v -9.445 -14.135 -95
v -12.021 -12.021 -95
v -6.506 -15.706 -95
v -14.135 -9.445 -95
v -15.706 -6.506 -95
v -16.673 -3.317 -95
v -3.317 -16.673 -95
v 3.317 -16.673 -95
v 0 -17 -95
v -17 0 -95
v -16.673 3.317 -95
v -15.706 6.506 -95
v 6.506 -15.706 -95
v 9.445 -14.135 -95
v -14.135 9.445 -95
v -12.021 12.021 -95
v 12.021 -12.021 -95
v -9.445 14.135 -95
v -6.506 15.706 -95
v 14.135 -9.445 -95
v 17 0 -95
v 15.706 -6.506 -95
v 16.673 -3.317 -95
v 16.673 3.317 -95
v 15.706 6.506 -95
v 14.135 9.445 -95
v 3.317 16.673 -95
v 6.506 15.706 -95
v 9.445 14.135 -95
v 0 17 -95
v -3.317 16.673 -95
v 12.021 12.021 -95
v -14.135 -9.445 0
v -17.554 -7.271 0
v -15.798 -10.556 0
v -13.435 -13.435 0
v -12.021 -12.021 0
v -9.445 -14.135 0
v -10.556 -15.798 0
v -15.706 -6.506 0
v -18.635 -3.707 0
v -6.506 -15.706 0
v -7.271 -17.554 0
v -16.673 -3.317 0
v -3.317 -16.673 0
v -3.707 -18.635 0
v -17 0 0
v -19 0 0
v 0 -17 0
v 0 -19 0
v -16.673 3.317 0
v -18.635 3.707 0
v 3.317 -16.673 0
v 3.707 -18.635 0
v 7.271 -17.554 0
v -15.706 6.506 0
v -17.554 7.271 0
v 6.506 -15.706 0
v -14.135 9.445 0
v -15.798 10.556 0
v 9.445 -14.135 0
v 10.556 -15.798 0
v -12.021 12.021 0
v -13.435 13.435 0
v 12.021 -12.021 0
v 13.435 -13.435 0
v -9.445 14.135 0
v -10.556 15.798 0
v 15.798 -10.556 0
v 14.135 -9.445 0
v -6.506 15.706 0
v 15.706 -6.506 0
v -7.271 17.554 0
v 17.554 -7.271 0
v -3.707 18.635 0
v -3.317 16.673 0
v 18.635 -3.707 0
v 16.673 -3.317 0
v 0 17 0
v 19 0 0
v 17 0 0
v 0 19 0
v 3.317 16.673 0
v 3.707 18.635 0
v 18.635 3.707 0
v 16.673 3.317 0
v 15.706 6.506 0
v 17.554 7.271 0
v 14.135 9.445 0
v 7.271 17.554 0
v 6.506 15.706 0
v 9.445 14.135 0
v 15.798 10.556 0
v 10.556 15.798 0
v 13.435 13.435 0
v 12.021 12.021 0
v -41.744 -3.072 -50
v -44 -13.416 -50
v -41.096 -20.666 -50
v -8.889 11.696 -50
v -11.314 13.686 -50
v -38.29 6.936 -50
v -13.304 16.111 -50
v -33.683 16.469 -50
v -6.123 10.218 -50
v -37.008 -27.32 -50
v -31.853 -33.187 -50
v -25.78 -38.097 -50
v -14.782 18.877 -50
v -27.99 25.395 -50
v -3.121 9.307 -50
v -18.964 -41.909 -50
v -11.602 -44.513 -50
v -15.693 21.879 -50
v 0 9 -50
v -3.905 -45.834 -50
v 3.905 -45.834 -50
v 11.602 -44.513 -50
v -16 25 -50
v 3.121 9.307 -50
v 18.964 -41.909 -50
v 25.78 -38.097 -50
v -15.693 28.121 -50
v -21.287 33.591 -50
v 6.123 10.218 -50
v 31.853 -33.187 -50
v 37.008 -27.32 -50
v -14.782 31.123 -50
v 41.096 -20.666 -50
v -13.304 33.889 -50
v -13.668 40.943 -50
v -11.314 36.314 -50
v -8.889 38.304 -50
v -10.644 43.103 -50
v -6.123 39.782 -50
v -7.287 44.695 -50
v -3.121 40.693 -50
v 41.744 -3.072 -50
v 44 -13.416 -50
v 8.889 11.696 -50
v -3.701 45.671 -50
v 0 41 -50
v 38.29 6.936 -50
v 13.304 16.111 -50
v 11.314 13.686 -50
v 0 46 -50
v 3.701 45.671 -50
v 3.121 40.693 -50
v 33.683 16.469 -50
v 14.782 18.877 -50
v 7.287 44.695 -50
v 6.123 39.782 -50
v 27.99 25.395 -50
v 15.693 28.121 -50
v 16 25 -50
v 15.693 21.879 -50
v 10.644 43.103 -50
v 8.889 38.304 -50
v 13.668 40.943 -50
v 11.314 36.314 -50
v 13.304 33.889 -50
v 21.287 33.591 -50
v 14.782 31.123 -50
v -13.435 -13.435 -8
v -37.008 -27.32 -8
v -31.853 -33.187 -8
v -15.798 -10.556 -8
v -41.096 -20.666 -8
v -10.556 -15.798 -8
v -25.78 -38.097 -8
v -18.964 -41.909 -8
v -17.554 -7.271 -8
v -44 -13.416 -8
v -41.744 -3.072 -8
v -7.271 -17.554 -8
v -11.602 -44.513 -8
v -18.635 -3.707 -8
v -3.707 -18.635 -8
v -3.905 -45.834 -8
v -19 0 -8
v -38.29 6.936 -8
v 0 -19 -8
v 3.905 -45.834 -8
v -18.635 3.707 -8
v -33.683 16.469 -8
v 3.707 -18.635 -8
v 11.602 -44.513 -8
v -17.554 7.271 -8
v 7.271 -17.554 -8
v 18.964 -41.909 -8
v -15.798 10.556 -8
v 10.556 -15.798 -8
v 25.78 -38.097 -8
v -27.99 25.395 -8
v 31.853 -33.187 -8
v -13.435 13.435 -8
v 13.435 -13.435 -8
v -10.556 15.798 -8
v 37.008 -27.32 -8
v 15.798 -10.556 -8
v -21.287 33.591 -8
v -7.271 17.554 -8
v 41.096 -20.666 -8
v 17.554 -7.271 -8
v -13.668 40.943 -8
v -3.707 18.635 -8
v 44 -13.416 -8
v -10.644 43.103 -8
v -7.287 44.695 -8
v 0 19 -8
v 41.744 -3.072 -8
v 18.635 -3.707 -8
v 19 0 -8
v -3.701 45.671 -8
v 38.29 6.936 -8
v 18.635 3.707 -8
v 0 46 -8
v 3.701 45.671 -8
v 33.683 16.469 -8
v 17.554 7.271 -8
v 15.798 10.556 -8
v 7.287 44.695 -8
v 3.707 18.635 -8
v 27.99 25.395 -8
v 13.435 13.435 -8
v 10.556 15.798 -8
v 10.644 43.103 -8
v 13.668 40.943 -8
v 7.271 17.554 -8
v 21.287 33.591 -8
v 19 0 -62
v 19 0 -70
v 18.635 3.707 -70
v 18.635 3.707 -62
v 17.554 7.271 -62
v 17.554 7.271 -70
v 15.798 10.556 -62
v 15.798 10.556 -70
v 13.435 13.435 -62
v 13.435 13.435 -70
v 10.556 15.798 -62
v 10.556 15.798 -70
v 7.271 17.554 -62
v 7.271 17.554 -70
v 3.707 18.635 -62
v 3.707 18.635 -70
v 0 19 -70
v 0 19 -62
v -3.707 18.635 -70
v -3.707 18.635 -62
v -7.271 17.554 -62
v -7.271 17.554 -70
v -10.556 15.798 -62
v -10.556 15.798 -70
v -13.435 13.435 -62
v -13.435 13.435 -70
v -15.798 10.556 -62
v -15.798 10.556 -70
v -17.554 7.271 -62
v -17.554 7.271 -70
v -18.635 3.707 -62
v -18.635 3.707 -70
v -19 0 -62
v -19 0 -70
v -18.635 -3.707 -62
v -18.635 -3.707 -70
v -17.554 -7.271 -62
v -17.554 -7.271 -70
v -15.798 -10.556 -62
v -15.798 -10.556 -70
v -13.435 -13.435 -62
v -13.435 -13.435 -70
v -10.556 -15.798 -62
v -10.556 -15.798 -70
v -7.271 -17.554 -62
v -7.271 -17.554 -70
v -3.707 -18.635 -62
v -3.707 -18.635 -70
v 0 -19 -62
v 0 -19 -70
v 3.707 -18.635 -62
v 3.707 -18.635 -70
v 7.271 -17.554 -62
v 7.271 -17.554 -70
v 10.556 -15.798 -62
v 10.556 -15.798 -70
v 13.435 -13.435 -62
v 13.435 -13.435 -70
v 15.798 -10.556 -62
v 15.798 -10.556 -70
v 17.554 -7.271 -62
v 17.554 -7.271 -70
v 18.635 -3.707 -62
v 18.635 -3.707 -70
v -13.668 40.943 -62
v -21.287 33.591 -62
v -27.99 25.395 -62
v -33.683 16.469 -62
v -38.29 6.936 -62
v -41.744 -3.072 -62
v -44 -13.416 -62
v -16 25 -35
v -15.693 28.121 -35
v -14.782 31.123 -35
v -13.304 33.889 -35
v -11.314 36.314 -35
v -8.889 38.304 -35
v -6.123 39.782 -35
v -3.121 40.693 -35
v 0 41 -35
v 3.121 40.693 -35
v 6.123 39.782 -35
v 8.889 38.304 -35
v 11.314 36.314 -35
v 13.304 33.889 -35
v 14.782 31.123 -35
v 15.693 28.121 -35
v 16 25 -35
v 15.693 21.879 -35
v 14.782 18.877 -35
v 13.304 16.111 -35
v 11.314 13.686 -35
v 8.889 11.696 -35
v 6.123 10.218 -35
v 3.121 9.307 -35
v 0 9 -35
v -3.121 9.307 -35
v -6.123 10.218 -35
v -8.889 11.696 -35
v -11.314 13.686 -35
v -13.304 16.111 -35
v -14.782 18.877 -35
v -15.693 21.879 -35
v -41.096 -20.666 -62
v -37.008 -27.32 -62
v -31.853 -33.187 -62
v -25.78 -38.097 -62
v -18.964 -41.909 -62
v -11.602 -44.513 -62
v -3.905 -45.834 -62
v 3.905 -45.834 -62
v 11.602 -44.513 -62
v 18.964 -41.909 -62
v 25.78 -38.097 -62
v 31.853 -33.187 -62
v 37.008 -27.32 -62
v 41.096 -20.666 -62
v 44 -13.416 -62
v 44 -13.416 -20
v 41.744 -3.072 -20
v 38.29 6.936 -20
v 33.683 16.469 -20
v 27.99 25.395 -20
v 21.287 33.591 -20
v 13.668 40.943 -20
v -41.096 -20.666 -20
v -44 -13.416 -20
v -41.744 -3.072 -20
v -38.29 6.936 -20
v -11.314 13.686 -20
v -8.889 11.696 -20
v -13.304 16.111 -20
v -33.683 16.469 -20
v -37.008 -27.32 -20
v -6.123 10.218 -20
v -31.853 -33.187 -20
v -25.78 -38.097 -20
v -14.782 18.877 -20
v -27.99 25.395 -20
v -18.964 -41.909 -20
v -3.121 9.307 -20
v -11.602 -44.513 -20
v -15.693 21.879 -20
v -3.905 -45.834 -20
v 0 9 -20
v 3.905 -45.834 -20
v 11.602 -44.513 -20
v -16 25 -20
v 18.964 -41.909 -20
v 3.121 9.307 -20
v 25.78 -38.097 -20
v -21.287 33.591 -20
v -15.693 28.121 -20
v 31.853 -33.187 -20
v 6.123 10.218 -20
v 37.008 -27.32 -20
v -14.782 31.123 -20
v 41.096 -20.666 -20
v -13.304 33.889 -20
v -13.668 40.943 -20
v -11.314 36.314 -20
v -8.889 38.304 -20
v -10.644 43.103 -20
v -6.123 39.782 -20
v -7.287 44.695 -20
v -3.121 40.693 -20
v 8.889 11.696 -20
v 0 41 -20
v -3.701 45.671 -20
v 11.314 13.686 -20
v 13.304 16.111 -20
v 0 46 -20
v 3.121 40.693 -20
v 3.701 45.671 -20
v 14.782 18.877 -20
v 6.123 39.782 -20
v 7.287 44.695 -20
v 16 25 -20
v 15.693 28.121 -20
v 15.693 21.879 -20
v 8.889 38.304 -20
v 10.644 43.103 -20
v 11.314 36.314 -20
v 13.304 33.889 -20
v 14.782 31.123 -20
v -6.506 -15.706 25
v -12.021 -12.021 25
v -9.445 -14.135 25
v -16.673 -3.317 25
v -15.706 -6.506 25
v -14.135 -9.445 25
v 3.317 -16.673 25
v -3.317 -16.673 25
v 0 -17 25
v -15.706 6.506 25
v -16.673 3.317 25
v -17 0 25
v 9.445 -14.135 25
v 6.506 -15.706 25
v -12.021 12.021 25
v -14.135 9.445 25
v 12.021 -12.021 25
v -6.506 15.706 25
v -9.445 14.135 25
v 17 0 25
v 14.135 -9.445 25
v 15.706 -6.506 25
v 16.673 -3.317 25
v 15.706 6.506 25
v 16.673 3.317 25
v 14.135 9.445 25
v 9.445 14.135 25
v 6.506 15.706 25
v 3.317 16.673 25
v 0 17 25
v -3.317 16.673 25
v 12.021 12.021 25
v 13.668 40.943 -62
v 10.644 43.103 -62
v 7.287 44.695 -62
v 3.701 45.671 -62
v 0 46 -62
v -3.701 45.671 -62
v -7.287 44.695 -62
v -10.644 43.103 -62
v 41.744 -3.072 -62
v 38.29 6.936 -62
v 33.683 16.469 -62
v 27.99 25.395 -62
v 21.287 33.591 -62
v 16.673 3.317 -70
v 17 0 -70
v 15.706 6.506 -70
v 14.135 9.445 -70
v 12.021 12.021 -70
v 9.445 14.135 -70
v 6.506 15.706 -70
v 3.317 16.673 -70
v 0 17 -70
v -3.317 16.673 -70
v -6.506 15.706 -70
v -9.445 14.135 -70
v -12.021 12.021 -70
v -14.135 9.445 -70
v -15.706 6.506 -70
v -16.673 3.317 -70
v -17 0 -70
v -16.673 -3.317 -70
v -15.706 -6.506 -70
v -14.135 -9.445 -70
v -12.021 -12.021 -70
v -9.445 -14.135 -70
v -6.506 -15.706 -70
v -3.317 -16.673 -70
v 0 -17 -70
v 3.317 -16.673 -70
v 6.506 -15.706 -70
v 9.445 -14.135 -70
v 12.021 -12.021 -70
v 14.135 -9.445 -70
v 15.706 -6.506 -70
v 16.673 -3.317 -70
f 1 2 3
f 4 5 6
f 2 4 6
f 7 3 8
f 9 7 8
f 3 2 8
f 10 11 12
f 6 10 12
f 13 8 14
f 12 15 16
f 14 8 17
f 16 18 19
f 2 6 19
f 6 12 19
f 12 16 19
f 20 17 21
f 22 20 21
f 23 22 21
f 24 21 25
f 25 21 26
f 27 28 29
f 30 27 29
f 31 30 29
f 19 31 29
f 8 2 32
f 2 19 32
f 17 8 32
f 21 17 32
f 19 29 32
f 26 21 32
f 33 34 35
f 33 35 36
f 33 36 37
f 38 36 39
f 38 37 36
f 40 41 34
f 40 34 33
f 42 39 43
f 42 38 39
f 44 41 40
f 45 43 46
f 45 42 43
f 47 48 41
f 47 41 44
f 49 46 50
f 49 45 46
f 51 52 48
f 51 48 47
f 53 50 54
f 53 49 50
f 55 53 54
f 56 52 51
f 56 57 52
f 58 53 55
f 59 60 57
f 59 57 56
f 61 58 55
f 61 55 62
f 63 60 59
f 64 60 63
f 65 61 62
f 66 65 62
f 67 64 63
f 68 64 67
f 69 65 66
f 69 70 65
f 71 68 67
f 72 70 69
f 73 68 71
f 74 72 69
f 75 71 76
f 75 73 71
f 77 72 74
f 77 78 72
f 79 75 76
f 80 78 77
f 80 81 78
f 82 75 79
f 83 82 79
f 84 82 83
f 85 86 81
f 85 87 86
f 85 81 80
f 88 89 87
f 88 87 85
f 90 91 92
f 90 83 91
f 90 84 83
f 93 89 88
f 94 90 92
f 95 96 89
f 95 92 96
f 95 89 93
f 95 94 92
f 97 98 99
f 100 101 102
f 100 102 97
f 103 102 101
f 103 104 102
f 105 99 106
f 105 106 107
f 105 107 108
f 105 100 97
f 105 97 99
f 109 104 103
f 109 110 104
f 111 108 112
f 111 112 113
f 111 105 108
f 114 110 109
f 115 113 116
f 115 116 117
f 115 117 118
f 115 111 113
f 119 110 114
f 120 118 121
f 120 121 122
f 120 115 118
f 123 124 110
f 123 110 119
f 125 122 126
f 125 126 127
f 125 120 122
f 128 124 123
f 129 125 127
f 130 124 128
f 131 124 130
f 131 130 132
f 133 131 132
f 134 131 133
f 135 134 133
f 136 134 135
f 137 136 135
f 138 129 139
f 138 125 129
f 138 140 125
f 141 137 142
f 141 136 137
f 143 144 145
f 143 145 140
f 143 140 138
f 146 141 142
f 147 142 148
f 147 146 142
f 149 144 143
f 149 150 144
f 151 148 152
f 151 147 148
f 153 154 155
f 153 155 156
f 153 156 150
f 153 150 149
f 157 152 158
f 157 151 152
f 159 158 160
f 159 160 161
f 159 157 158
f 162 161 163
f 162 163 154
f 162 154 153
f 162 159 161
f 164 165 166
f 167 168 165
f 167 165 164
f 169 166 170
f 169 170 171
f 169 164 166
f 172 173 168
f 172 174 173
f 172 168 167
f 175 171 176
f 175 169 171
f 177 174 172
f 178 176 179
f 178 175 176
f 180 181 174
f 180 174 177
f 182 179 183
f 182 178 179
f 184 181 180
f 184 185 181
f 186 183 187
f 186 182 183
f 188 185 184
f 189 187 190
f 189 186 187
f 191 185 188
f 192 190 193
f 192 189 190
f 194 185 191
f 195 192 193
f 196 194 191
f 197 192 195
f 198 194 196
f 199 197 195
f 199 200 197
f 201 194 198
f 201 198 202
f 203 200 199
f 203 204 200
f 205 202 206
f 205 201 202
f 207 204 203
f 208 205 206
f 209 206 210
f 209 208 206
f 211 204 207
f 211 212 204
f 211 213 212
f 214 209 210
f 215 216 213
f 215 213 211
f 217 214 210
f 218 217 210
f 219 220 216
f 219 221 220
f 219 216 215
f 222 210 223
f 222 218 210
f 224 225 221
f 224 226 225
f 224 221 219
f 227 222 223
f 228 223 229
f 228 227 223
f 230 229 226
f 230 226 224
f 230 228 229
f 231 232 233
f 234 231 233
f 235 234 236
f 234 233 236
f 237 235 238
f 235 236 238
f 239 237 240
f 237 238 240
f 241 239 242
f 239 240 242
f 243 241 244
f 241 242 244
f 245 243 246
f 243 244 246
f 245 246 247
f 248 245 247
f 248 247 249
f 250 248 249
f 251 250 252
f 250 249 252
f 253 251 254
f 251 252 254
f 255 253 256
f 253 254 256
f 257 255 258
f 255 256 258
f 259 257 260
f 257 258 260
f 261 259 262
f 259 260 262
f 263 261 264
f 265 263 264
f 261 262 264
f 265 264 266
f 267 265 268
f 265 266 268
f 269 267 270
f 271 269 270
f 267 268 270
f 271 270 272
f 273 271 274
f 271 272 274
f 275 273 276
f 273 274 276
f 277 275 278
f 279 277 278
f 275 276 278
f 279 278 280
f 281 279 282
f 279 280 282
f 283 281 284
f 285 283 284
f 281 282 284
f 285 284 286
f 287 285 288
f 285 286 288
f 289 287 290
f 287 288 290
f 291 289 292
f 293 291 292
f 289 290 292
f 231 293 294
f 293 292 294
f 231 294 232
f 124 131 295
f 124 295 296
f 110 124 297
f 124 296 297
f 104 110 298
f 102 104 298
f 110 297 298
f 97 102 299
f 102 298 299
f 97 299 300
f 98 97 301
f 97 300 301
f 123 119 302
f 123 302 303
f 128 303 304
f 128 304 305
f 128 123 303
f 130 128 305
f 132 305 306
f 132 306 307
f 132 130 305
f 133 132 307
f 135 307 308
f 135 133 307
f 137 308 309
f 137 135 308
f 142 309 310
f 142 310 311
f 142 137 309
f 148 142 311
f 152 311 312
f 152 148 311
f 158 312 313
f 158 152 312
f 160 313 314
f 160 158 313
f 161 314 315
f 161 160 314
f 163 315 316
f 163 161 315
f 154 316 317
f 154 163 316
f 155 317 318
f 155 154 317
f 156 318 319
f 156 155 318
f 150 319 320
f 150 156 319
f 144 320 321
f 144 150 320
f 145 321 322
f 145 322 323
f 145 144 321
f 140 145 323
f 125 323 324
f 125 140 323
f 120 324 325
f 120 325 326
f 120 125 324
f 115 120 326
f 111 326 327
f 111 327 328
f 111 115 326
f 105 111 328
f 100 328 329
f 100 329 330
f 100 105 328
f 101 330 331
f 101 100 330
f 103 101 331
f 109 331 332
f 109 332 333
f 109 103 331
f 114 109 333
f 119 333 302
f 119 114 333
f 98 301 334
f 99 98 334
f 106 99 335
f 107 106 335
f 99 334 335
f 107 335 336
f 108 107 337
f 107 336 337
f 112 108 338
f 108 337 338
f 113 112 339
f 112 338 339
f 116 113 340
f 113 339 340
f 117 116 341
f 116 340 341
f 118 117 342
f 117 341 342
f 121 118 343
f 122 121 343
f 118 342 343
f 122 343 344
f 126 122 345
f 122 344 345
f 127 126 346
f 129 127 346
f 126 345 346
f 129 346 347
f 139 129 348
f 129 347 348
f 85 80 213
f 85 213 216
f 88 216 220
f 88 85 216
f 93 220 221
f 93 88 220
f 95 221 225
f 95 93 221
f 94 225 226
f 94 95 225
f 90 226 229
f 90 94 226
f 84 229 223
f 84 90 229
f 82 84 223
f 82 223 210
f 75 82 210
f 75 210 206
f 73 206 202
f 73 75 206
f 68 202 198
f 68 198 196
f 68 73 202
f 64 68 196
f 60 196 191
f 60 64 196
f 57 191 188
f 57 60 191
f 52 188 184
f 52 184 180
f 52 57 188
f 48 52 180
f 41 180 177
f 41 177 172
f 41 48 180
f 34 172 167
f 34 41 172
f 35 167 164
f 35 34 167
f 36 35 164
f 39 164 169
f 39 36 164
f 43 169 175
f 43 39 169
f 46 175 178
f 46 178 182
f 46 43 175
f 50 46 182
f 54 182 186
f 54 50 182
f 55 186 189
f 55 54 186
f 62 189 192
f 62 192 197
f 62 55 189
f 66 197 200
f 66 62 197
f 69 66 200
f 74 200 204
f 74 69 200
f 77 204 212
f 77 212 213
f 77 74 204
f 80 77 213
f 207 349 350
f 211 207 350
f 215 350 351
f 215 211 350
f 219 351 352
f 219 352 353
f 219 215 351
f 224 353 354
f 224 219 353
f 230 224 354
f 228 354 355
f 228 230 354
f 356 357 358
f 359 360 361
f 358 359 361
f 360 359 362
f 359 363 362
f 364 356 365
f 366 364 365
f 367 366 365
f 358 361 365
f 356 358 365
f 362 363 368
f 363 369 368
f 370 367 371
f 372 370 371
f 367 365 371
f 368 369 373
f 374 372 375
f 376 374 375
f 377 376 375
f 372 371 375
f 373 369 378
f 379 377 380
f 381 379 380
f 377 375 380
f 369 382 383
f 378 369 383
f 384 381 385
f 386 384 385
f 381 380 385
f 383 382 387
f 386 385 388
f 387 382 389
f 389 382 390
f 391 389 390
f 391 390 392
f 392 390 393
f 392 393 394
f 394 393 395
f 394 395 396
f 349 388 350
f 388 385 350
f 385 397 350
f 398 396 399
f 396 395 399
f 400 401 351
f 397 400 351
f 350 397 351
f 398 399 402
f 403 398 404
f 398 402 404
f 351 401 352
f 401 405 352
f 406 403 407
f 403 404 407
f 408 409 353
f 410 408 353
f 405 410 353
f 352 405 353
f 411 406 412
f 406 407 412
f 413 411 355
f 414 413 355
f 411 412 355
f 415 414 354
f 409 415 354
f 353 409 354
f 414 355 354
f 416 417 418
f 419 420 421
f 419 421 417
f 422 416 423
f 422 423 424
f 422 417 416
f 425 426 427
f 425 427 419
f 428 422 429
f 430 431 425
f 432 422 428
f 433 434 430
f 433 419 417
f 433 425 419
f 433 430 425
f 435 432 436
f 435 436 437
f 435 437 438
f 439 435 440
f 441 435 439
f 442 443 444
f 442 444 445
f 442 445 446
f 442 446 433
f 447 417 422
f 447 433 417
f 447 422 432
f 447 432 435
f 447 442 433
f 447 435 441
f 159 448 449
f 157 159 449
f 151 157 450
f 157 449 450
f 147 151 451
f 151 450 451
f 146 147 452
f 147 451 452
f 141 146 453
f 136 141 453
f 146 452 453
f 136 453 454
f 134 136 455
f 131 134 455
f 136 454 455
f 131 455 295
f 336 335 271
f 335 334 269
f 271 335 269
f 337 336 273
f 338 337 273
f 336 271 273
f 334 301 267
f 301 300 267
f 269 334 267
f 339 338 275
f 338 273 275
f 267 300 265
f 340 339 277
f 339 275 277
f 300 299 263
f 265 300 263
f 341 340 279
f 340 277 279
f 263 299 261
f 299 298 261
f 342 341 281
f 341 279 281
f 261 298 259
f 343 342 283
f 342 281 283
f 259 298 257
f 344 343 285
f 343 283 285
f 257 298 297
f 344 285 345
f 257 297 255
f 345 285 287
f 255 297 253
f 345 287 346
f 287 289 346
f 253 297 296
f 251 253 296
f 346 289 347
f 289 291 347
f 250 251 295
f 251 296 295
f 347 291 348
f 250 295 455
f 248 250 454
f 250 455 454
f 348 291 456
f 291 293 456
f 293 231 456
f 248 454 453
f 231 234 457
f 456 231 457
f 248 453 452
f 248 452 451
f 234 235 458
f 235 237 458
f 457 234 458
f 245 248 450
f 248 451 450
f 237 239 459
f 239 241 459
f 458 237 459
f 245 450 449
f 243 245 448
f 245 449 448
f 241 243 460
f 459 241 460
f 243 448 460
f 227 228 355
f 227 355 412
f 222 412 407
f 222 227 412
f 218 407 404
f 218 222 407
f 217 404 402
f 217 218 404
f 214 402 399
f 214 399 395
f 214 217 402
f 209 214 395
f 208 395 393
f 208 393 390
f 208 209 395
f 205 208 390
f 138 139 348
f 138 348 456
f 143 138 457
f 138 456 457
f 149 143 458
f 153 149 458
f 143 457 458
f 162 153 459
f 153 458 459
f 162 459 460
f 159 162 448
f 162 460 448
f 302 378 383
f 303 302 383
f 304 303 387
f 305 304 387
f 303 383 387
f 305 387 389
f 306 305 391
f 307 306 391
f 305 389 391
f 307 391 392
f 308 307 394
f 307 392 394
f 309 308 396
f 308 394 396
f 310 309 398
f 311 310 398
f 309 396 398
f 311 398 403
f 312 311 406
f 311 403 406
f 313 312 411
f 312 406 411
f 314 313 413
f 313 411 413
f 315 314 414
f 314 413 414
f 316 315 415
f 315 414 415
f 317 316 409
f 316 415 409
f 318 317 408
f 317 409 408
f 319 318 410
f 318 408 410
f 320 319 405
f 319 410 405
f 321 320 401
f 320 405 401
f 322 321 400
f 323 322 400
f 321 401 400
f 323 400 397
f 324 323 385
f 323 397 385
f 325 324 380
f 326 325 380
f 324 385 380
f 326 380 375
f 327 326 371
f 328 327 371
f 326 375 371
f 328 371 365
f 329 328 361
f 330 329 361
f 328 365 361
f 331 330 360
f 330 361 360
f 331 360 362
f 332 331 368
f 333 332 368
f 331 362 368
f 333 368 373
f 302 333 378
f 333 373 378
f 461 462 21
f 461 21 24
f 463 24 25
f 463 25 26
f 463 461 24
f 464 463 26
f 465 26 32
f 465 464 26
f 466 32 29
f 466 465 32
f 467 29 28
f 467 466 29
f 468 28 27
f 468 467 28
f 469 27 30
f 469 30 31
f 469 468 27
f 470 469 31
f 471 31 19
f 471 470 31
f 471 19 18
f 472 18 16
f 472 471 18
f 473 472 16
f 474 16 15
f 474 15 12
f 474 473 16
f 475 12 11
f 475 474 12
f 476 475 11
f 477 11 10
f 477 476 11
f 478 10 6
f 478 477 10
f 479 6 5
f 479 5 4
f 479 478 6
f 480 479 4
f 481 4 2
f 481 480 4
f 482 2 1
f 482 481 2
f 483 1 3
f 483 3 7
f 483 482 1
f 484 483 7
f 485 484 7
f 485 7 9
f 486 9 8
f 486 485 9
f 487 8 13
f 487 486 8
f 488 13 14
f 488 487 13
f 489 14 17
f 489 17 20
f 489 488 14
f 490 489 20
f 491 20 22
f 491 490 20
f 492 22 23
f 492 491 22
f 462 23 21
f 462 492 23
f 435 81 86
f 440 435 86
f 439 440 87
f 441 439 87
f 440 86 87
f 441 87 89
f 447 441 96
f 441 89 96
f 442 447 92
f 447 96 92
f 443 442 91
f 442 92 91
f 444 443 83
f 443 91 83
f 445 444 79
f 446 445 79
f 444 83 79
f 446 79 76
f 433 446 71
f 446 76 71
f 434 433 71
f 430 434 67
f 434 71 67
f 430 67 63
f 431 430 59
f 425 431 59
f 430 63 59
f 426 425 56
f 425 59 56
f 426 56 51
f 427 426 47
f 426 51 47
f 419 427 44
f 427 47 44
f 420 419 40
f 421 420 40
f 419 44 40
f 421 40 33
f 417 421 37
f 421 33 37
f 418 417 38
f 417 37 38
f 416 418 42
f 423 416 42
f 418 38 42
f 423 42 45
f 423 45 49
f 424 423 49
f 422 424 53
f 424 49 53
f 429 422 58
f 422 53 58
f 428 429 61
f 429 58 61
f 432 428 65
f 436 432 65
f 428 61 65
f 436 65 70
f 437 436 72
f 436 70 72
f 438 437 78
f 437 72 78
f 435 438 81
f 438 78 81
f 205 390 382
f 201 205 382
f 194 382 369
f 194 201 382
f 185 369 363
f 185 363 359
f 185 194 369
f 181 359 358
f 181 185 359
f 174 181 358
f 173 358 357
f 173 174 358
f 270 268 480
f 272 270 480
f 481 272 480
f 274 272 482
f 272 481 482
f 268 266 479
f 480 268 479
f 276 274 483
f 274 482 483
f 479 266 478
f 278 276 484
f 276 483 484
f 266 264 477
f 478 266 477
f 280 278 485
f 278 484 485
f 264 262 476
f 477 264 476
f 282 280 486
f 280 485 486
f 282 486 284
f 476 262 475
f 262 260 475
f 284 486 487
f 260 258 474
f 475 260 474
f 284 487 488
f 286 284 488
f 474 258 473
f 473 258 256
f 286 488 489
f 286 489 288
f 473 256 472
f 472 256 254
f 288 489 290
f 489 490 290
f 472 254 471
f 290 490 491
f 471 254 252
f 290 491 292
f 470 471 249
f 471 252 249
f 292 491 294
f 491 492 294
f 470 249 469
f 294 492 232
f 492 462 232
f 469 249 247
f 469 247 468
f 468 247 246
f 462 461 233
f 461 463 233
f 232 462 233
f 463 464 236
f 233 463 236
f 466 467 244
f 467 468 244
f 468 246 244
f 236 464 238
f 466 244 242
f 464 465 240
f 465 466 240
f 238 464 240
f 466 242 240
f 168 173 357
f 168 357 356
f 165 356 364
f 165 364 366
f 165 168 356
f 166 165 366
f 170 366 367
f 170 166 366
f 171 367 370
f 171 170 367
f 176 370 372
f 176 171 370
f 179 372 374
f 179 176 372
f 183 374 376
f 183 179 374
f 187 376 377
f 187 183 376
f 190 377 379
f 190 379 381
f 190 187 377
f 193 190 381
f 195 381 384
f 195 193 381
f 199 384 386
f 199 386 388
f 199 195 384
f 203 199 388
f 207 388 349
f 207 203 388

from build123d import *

# Parameters (mm, degrees)
SKETCH1_R           = 17
BOSS_EXTRUDE1_DEPTH = 25
SKETCH2_R           = 19
BOSS_EXTRUDE2_DEPTH = 8
BOSS_EXTRUDE3_DEPTH = 12
SKETCH6_R           = 16
BOSS_EXTRUDE4_DEPTH = 15


with BuildPart() as part:
    # Sketch1 → Boss-Extrude1 (new body)
    with BuildSketch(Plane.XY):
        Circle(SKETCH1_R)
    extrude(amount=BOSS_EXTRUDE1_DEPTH)

    # Sketch2 → Boss-Extrude2 (add)
    with BuildSketch(Plane.XY):
        Circle(SKETCH2_R)
    extrude(amount=-BOSS_EXTRUDE2_DEPTH)

    # Sketch5 → Boss-Extrude3 (add)
    with BuildSketch(Plane(origin=(0, 0, -8), x_dir=(-1, 0, 0), z_dir=(0, 0, -1))):
        with BuildLine():
            ThreePointArc((44, -13.416407865), (0, -46), (-44, -13.416407865))
            ThreePointArc((-44, -13.416407865), (-33.683444249, 16.469257624), (-13.668094758, 40.943123461))
            ThreePointArc((-13.668094758, 40.943123461), (0, 46), (13.668094758, 40.943123461))
            ThreePointArc((13.668094758, 40.943123461), (33.683444249, 16.469257624), (44, -13.416407865))
        make_face()
    extrude(amount=BOSS_EXTRUDE3_DEPTH)

    # Sketch6 → Boss-Extrude4 (add)
    with BuildSketch(Plane(origin=(0, 0, -20), x_dir=(-1, 0, 0), z_dir=(0, 0, -1))):
        with Locations((0, 25)):
            Circle(SKETCH6_R)
    extrude(amount=BOSS_EXTRUDE4_DEPTH)

    # Mirror2: part across plane


with BuildPart() as part_1:
    add(part.part)
    add(part.part.mirror(Plane(origin=(0, 25, -35), x_dir=(1, 0, 0), z_dir=(0, 0, -1))))


solid = part_1.part
